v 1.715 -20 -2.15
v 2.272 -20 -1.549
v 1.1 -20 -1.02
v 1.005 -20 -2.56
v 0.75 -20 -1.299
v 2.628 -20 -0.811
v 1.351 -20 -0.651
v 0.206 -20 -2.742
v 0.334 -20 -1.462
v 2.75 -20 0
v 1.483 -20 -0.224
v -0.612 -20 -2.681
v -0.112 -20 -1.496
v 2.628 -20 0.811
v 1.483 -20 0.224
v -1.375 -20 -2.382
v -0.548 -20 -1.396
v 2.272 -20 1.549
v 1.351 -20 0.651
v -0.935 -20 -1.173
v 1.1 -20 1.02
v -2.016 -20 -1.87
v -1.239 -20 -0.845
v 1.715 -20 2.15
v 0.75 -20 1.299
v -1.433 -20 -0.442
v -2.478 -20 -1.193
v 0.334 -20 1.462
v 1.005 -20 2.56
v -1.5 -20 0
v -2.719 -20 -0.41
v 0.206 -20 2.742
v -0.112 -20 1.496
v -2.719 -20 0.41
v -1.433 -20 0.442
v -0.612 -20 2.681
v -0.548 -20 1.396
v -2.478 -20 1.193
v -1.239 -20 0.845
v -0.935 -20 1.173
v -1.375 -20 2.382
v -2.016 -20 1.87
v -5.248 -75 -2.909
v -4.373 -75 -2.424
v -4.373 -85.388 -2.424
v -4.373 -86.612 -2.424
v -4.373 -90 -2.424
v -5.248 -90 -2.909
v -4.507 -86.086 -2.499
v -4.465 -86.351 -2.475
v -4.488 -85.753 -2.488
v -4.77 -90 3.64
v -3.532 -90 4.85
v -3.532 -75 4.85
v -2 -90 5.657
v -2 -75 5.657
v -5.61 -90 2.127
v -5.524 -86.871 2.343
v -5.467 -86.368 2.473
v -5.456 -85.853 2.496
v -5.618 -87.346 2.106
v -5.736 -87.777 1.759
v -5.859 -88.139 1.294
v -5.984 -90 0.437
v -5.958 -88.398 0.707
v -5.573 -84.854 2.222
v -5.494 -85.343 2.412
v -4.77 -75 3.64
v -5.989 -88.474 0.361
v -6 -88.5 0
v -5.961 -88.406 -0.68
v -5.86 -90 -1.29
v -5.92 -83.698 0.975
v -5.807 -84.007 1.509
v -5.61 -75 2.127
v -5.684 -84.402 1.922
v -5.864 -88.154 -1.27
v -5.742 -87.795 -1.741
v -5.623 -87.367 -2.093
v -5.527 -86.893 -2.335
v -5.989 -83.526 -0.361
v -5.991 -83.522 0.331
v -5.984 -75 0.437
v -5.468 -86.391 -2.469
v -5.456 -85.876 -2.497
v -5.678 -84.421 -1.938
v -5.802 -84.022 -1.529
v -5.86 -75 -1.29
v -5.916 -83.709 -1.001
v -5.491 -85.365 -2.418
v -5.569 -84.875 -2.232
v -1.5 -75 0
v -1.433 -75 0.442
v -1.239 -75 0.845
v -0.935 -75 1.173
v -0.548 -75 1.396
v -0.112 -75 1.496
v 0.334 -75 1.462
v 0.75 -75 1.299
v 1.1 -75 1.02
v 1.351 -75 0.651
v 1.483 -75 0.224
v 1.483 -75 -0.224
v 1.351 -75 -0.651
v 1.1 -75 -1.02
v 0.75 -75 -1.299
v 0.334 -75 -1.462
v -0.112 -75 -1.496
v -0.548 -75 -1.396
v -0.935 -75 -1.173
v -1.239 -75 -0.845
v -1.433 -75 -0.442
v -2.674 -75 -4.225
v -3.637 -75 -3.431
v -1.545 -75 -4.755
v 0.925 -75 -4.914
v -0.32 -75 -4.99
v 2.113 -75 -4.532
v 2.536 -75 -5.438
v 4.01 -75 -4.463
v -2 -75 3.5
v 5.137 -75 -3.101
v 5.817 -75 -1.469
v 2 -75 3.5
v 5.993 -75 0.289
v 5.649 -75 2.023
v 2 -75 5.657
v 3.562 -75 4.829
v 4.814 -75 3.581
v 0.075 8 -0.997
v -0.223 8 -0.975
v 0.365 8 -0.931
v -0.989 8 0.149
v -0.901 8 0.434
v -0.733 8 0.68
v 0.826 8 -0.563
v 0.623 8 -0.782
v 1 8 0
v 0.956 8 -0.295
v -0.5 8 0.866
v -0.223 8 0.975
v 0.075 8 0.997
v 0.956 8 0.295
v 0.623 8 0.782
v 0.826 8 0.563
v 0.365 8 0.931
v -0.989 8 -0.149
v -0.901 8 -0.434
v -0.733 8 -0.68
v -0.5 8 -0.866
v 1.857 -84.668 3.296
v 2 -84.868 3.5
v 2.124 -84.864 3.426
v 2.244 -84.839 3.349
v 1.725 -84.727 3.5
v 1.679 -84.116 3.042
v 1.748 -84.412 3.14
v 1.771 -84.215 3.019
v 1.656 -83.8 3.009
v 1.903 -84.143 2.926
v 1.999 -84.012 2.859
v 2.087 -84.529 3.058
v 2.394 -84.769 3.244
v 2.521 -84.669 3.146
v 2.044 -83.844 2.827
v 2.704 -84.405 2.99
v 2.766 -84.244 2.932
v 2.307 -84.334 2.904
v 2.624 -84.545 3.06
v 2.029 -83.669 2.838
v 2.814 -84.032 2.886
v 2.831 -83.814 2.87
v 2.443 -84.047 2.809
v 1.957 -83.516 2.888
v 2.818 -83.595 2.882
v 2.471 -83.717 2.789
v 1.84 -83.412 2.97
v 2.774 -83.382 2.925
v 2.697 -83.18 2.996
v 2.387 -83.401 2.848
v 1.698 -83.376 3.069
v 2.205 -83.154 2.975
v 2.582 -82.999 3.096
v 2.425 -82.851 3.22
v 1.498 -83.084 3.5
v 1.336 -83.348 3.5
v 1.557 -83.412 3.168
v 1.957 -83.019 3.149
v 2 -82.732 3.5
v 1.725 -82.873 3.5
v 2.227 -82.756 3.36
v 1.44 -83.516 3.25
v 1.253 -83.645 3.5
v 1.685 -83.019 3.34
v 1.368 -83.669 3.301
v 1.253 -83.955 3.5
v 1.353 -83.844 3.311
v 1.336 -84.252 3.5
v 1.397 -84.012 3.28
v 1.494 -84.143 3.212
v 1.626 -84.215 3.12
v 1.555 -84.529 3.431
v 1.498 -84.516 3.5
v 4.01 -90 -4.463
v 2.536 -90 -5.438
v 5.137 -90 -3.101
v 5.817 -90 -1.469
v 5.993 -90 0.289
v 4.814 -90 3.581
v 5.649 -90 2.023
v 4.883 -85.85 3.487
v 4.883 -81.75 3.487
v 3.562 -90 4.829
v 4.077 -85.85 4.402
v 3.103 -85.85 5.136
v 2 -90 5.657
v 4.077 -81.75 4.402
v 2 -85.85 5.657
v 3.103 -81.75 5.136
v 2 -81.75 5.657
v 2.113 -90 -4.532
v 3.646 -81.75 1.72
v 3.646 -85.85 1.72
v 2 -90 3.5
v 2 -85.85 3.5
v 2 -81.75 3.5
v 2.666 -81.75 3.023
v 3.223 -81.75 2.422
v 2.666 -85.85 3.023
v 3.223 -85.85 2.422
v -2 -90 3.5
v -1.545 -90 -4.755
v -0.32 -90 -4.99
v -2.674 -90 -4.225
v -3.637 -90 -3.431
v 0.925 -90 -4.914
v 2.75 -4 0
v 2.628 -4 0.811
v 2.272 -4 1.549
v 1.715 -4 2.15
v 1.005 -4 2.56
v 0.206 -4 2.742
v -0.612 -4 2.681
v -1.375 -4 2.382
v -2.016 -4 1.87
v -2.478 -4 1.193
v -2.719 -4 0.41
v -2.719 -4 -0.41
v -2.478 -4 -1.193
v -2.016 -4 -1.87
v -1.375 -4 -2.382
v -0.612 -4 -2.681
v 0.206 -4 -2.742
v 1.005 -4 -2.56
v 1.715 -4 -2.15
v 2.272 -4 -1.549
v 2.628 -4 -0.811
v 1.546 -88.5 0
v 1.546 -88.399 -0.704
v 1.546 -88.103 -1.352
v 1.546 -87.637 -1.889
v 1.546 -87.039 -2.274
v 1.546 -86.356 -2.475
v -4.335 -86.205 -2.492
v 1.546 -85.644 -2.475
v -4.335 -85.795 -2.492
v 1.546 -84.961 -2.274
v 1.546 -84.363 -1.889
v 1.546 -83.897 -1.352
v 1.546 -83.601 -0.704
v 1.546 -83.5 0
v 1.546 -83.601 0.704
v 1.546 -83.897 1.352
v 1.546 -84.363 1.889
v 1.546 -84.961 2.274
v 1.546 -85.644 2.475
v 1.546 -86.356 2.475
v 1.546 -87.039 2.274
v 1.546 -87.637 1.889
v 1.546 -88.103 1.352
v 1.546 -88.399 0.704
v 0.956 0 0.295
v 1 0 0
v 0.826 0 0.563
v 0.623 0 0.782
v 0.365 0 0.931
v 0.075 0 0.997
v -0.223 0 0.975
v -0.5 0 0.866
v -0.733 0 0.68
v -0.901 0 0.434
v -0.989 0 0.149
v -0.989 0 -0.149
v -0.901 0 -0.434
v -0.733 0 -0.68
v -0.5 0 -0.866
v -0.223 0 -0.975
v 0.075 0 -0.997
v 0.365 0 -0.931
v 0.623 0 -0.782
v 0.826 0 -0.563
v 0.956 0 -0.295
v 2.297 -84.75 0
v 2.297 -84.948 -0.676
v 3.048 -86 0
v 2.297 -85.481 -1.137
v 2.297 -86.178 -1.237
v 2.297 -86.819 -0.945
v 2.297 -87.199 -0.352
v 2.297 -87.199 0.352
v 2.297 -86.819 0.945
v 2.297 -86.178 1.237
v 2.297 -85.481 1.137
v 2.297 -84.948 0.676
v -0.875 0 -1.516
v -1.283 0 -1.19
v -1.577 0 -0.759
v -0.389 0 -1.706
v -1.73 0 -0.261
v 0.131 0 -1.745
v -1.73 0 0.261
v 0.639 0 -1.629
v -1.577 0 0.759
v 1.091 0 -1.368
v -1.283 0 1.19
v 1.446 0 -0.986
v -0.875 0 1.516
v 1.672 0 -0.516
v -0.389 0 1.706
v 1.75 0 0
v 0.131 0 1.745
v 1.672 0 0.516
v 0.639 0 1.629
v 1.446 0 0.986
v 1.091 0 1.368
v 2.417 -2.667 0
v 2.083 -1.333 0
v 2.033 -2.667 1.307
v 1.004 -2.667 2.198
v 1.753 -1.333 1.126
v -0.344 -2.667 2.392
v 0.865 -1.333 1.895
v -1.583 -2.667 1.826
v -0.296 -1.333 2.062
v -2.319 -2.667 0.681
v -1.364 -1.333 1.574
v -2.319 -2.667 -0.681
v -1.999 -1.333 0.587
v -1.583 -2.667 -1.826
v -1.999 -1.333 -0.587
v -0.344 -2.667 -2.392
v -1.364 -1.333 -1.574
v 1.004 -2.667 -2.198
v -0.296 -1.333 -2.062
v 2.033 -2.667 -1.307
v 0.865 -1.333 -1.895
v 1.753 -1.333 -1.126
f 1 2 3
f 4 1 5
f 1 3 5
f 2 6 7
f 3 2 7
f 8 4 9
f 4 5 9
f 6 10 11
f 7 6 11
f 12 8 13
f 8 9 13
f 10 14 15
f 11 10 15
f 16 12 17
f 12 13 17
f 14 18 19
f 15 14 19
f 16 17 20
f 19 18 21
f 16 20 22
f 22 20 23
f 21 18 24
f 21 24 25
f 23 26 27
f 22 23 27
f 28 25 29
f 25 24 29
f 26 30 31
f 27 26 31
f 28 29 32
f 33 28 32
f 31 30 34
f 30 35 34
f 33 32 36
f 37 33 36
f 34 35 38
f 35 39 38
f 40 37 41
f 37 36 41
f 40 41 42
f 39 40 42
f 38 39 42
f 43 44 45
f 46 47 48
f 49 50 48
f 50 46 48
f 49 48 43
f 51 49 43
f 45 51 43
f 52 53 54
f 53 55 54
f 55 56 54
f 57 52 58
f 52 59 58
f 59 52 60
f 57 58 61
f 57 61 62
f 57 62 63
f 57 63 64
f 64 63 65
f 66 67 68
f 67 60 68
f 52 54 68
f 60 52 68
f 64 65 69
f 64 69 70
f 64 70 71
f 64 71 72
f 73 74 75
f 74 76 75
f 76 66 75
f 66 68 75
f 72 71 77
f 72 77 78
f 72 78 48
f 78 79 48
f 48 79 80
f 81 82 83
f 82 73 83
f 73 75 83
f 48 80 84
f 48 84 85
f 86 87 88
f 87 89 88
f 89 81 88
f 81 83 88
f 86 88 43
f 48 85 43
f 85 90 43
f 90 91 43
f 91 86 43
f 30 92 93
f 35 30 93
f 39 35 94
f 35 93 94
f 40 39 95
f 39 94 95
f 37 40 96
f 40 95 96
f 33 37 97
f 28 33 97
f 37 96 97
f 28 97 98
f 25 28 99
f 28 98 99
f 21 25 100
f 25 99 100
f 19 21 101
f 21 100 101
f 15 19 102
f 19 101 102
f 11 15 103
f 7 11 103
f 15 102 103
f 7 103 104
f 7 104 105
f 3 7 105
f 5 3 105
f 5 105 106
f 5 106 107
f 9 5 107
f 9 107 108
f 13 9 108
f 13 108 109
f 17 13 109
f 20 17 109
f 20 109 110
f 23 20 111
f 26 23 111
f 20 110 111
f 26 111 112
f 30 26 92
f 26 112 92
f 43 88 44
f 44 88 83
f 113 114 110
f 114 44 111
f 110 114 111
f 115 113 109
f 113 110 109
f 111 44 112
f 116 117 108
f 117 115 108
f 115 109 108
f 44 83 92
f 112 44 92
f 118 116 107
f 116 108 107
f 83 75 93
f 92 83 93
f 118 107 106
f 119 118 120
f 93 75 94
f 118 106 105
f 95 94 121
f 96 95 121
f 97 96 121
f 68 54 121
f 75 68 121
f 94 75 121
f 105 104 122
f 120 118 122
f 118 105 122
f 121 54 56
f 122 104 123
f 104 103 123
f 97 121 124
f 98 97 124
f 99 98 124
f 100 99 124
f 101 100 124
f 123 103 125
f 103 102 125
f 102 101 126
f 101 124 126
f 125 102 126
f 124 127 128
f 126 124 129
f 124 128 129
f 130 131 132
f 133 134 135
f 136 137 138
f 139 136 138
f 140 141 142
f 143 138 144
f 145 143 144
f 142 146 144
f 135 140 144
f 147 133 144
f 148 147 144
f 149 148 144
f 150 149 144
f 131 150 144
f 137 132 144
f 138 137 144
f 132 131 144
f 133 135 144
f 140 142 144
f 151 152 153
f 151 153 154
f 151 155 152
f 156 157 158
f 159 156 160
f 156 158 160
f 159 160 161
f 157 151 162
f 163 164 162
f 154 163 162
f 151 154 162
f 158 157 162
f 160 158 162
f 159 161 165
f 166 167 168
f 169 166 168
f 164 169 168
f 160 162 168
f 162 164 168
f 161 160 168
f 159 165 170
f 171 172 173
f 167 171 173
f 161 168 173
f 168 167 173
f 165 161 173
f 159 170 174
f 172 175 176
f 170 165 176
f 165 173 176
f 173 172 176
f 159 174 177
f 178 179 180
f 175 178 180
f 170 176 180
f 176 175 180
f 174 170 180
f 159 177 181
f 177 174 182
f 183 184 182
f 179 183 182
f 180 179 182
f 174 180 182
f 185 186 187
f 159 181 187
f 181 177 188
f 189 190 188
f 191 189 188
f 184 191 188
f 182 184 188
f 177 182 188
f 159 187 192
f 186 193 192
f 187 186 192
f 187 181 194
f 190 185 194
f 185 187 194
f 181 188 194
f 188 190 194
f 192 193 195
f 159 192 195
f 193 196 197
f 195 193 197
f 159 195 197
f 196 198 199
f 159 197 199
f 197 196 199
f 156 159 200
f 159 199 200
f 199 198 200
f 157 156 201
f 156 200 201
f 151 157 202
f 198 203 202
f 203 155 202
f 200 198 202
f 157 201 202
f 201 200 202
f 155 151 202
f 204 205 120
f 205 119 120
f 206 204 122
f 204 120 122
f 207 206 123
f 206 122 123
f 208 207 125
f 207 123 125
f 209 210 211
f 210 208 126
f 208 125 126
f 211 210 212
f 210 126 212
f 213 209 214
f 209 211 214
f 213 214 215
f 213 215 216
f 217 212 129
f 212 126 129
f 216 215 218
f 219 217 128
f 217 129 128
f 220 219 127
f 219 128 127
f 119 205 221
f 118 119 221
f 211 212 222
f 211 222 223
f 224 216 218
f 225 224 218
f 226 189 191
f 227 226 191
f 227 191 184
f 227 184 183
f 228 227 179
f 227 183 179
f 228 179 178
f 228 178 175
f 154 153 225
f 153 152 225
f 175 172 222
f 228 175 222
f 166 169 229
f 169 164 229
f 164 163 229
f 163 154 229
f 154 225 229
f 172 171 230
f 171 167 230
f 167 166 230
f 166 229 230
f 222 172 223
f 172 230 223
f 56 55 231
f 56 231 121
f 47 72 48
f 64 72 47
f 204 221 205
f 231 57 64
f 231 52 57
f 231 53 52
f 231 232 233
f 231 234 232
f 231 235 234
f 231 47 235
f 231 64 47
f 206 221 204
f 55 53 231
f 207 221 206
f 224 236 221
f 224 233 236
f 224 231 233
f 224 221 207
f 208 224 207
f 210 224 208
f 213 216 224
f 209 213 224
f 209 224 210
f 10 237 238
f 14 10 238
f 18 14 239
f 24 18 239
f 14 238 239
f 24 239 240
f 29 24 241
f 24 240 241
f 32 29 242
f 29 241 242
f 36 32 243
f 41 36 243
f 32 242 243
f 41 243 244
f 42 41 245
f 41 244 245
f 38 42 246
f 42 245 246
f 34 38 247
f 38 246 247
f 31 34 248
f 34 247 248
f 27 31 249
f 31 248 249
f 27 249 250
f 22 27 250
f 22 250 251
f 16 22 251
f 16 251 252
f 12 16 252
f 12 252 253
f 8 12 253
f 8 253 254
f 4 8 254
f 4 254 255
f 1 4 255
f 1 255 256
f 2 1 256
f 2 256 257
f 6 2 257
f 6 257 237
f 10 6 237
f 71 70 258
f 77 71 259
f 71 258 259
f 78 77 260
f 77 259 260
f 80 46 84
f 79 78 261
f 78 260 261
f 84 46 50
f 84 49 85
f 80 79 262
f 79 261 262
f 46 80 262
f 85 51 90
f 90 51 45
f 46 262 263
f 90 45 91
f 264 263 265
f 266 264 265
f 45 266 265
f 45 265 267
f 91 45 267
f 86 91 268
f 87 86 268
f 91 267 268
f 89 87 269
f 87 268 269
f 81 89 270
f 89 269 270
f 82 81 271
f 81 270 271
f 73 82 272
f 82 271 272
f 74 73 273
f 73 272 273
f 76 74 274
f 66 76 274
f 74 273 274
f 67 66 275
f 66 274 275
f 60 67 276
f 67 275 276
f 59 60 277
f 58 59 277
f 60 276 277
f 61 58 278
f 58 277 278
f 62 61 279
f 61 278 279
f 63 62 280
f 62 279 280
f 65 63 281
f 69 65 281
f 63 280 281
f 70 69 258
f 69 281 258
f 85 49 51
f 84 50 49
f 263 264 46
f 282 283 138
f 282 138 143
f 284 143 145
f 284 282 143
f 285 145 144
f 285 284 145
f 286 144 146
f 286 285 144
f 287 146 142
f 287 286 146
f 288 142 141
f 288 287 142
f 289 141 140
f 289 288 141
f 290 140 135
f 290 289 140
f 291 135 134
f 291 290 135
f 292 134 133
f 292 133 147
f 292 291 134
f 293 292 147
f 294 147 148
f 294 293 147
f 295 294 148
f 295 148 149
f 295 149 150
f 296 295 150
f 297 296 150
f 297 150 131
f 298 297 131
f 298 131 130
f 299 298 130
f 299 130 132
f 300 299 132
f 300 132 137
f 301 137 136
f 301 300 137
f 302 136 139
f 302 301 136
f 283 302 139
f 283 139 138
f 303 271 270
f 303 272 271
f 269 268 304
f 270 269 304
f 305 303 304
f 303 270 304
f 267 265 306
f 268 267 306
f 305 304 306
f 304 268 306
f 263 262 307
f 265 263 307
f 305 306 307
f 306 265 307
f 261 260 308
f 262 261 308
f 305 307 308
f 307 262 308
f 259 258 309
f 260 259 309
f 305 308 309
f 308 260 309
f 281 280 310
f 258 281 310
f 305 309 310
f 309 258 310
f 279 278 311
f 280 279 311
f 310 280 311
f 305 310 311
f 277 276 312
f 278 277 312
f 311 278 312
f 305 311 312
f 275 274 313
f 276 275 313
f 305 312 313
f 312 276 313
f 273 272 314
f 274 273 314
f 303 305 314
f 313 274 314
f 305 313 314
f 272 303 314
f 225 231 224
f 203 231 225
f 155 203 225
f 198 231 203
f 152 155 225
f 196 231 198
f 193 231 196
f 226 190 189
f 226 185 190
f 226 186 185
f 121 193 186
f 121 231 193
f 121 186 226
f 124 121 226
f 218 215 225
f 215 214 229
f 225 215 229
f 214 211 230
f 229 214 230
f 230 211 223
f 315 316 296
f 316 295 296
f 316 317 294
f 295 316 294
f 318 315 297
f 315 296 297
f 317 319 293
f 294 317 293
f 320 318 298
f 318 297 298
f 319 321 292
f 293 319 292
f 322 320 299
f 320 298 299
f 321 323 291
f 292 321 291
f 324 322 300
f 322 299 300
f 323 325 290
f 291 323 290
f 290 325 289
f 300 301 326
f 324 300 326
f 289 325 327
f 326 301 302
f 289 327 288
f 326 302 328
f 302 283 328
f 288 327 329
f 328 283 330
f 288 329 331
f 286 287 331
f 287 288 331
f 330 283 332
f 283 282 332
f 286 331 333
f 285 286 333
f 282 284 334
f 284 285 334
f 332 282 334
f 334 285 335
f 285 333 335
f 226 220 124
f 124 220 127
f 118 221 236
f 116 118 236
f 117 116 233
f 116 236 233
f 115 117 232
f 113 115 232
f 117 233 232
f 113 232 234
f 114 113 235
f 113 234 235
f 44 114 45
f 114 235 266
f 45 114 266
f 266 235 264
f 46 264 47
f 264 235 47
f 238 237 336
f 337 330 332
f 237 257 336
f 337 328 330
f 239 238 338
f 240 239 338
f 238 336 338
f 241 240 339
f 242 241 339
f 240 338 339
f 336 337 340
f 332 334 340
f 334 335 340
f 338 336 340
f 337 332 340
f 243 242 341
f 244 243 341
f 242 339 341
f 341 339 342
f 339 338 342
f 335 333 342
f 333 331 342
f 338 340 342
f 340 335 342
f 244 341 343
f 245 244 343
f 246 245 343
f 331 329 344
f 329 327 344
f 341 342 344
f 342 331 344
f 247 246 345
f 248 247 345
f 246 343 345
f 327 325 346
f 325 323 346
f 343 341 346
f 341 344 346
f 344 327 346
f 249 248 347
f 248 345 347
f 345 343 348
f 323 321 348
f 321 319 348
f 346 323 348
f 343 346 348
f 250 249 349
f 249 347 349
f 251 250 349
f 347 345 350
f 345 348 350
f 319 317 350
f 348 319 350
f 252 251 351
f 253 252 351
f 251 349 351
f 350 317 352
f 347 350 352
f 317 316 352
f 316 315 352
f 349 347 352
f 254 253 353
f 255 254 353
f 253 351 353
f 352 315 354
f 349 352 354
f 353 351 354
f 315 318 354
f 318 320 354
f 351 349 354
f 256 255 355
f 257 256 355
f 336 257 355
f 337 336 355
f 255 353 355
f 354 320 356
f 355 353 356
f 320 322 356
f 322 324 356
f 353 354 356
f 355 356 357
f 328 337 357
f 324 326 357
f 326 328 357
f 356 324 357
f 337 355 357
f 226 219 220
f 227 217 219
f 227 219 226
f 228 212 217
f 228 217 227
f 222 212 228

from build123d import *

# Parameters (mm, degrees)
F0_R      = 1
F1_DEPTH  = 8
F2_R      = 2.75
F3_DEPTH  = 80
F4_SIZE2  = 1
F4_SIZE   = 4
F5_R      = 6
F5_R_2    = 2.75
F6_DEPTH  = 5
F7_DEPTH  = 10
F12_R     = 2.75
F12_R_2   = 1.5
F13_DEPTH = 55
F15_D     = 5
F15_DEPTH = 7
F15_START = 0.545644
F15_TIP   = 1.5021515476
F16_W     = 4
F16_H     = 15
F17_DEPTH = 2.5
F19_W     = 4.1
F19_H     = 2.1568542495
F20_ANGLE = 35
F28_DEPTH = 15


with BuildPart() as f1:
    # F0 (on Front) → F1 (new body)
    with BuildSketch(Plane.XZ):
        Circle(F0_R)
    extrude(amount=-F1_DEPTH)

    # F2 (on face) → F3 (join)
    with BuildSketch(Plane.XZ):
        Circle(F2_R)
    extrude(amount=F3_DEPTH)

    # F4
    f4_edges = [f1.edges().sort_by_distance(p)[0] for p in [
        (-2.75, 0, 0),
    ]]
    f4_side = f1.faces().sort_by_distance((-2.75, -40, 0))[0]
    chamfer(f4_edges, length=F4_SIZE, length2=F4_SIZE2, reference=f4_side)

    # F5 (on face) → F6 (join)
    with BuildSketch(Plane.XZ.offset(80)):
        Circle(F5_R)
        Circle(F5_R_2, mode=Mode.SUBTRACT)
    extrude(amount=-F6_DEPTH)

    # F7 (add): a face of the model
    f7_faces = [f1.faces().sort_by_distance(p)[0] for p in [
        (0, -80, 0),
    ]]
    extrude(f7_faces, amount=F7_DEPTH)

    # F12 (on face) → F13 (cut)
    with BuildSketch(Plane(origin=(0, -75, 0), x_dir=(-1, 0, 0), z_dir=(0, 1, 0))):
        Circle(F12_R)
        Circle(F12_R_2, mode=Mode.SUBTRACT)
    extrude(amount=F13_DEPTH, mode=Mode.SUBTRACT)

    # F15
    # its depths count from where the whole tool has entered the part; down to there all is cleared
    with Locations(Plane(origin=(-6, 0, 0), x_dir=(0, 1, 0), z_dir=(-1, 0, 0)).offset(-F15_START)):
        with Locations((-86, 0)):
            Hole(F15_D / 2, depth=F15_DEPTH)
            with Locations((0, 0, -(F15_DEPTH + F15_TIP / 2))):  # 118° drill point
                Cone(0, F15_D / 2, F15_TIP, mode=Mode.SUBTRACT)

    # F16 (on offset) → F17 (cut)
    with BuildSketch(Plane.XY.offset(6)):
        with Locations((0, -82.5)):
            Rectangle(F16_W, F16_H)
    extrude(amount=-F17_DEPTH, mode=Mode.SUBTRACT)

    # F19 (on face) → F20 (revolve, cut)
    with BuildSketch(Plane(origin=(2, 0, 0), x_dir=(0, -1, 0), z_dir=(-1, 0, 0))):
        with Locations((83.8, 4.5784271247)):
            Rectangle(F19_W, F19_H)
    revolve(axis=Axis((0, -80, 0), (0, 1, 0)), revolution_arc=F20_ANGLE, mode=Mode.SUBTRACT)

    # F25 (on face) → F26 (revolve, cut)
    with BuildSketch(Plane(origin=(-0.302441943, 0, 0.2117721284), x_dir=(0, -1, 0), z_dir=(-0.8191520443, 0, 0.5735764364))):
        with BuildLine():
            Line((83.8, 5.9141850277), (83.8, 3.4141850277))
            ThreePointArc((83.8, 3.4141850277), (85.05, 4.6641850277), (83.8, 5.9141850277))
        make_face()
    revolve(axis=Axis((2.3728246836, -83.8, 4.0324488288), (0.5735764364, 0, 0.8191520443)), mode=Mode.SUBTRACT)

    # F27 (on face) → F28 (cut)
    with BuildSketch(Plane.XZ.offset(90)):
        with BuildLine():
            ThreePointArc((-5.2477182428, -2.9088577215), (-1.8541019662, -5.7063390978), (2.5357095704, -5.4378467222))
            Line((2.5357095704, -5.4378467222), (2.1130913087, -4.5315389352))
            ThreePointArc((2.1130913087, -4.5315389352), (-1.5450849719, -4.7552825815), (-4.3730985357, -2.4240481012))
            Line((-4.3730985357, -2.4240481012), (-5.2477182428, -2.9088577215))
        make_face()
    extrude(amount=-F28_DEPTH, mode=Mode.SUBTRACT)


solid = f1.part
